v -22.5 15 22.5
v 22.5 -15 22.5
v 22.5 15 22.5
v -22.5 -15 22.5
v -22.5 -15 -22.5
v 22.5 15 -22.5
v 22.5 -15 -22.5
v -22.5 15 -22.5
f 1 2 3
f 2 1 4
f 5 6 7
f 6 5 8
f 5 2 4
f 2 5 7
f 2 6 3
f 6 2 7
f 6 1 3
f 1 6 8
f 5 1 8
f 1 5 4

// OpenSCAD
// ========================================
// a 45 x 30 x 45 mm box
// NeuroCAD canonical IR; dimensions are millimetres
// ========================================
$fn = 48;

cube(size=[45, 30, 45], center=true);
